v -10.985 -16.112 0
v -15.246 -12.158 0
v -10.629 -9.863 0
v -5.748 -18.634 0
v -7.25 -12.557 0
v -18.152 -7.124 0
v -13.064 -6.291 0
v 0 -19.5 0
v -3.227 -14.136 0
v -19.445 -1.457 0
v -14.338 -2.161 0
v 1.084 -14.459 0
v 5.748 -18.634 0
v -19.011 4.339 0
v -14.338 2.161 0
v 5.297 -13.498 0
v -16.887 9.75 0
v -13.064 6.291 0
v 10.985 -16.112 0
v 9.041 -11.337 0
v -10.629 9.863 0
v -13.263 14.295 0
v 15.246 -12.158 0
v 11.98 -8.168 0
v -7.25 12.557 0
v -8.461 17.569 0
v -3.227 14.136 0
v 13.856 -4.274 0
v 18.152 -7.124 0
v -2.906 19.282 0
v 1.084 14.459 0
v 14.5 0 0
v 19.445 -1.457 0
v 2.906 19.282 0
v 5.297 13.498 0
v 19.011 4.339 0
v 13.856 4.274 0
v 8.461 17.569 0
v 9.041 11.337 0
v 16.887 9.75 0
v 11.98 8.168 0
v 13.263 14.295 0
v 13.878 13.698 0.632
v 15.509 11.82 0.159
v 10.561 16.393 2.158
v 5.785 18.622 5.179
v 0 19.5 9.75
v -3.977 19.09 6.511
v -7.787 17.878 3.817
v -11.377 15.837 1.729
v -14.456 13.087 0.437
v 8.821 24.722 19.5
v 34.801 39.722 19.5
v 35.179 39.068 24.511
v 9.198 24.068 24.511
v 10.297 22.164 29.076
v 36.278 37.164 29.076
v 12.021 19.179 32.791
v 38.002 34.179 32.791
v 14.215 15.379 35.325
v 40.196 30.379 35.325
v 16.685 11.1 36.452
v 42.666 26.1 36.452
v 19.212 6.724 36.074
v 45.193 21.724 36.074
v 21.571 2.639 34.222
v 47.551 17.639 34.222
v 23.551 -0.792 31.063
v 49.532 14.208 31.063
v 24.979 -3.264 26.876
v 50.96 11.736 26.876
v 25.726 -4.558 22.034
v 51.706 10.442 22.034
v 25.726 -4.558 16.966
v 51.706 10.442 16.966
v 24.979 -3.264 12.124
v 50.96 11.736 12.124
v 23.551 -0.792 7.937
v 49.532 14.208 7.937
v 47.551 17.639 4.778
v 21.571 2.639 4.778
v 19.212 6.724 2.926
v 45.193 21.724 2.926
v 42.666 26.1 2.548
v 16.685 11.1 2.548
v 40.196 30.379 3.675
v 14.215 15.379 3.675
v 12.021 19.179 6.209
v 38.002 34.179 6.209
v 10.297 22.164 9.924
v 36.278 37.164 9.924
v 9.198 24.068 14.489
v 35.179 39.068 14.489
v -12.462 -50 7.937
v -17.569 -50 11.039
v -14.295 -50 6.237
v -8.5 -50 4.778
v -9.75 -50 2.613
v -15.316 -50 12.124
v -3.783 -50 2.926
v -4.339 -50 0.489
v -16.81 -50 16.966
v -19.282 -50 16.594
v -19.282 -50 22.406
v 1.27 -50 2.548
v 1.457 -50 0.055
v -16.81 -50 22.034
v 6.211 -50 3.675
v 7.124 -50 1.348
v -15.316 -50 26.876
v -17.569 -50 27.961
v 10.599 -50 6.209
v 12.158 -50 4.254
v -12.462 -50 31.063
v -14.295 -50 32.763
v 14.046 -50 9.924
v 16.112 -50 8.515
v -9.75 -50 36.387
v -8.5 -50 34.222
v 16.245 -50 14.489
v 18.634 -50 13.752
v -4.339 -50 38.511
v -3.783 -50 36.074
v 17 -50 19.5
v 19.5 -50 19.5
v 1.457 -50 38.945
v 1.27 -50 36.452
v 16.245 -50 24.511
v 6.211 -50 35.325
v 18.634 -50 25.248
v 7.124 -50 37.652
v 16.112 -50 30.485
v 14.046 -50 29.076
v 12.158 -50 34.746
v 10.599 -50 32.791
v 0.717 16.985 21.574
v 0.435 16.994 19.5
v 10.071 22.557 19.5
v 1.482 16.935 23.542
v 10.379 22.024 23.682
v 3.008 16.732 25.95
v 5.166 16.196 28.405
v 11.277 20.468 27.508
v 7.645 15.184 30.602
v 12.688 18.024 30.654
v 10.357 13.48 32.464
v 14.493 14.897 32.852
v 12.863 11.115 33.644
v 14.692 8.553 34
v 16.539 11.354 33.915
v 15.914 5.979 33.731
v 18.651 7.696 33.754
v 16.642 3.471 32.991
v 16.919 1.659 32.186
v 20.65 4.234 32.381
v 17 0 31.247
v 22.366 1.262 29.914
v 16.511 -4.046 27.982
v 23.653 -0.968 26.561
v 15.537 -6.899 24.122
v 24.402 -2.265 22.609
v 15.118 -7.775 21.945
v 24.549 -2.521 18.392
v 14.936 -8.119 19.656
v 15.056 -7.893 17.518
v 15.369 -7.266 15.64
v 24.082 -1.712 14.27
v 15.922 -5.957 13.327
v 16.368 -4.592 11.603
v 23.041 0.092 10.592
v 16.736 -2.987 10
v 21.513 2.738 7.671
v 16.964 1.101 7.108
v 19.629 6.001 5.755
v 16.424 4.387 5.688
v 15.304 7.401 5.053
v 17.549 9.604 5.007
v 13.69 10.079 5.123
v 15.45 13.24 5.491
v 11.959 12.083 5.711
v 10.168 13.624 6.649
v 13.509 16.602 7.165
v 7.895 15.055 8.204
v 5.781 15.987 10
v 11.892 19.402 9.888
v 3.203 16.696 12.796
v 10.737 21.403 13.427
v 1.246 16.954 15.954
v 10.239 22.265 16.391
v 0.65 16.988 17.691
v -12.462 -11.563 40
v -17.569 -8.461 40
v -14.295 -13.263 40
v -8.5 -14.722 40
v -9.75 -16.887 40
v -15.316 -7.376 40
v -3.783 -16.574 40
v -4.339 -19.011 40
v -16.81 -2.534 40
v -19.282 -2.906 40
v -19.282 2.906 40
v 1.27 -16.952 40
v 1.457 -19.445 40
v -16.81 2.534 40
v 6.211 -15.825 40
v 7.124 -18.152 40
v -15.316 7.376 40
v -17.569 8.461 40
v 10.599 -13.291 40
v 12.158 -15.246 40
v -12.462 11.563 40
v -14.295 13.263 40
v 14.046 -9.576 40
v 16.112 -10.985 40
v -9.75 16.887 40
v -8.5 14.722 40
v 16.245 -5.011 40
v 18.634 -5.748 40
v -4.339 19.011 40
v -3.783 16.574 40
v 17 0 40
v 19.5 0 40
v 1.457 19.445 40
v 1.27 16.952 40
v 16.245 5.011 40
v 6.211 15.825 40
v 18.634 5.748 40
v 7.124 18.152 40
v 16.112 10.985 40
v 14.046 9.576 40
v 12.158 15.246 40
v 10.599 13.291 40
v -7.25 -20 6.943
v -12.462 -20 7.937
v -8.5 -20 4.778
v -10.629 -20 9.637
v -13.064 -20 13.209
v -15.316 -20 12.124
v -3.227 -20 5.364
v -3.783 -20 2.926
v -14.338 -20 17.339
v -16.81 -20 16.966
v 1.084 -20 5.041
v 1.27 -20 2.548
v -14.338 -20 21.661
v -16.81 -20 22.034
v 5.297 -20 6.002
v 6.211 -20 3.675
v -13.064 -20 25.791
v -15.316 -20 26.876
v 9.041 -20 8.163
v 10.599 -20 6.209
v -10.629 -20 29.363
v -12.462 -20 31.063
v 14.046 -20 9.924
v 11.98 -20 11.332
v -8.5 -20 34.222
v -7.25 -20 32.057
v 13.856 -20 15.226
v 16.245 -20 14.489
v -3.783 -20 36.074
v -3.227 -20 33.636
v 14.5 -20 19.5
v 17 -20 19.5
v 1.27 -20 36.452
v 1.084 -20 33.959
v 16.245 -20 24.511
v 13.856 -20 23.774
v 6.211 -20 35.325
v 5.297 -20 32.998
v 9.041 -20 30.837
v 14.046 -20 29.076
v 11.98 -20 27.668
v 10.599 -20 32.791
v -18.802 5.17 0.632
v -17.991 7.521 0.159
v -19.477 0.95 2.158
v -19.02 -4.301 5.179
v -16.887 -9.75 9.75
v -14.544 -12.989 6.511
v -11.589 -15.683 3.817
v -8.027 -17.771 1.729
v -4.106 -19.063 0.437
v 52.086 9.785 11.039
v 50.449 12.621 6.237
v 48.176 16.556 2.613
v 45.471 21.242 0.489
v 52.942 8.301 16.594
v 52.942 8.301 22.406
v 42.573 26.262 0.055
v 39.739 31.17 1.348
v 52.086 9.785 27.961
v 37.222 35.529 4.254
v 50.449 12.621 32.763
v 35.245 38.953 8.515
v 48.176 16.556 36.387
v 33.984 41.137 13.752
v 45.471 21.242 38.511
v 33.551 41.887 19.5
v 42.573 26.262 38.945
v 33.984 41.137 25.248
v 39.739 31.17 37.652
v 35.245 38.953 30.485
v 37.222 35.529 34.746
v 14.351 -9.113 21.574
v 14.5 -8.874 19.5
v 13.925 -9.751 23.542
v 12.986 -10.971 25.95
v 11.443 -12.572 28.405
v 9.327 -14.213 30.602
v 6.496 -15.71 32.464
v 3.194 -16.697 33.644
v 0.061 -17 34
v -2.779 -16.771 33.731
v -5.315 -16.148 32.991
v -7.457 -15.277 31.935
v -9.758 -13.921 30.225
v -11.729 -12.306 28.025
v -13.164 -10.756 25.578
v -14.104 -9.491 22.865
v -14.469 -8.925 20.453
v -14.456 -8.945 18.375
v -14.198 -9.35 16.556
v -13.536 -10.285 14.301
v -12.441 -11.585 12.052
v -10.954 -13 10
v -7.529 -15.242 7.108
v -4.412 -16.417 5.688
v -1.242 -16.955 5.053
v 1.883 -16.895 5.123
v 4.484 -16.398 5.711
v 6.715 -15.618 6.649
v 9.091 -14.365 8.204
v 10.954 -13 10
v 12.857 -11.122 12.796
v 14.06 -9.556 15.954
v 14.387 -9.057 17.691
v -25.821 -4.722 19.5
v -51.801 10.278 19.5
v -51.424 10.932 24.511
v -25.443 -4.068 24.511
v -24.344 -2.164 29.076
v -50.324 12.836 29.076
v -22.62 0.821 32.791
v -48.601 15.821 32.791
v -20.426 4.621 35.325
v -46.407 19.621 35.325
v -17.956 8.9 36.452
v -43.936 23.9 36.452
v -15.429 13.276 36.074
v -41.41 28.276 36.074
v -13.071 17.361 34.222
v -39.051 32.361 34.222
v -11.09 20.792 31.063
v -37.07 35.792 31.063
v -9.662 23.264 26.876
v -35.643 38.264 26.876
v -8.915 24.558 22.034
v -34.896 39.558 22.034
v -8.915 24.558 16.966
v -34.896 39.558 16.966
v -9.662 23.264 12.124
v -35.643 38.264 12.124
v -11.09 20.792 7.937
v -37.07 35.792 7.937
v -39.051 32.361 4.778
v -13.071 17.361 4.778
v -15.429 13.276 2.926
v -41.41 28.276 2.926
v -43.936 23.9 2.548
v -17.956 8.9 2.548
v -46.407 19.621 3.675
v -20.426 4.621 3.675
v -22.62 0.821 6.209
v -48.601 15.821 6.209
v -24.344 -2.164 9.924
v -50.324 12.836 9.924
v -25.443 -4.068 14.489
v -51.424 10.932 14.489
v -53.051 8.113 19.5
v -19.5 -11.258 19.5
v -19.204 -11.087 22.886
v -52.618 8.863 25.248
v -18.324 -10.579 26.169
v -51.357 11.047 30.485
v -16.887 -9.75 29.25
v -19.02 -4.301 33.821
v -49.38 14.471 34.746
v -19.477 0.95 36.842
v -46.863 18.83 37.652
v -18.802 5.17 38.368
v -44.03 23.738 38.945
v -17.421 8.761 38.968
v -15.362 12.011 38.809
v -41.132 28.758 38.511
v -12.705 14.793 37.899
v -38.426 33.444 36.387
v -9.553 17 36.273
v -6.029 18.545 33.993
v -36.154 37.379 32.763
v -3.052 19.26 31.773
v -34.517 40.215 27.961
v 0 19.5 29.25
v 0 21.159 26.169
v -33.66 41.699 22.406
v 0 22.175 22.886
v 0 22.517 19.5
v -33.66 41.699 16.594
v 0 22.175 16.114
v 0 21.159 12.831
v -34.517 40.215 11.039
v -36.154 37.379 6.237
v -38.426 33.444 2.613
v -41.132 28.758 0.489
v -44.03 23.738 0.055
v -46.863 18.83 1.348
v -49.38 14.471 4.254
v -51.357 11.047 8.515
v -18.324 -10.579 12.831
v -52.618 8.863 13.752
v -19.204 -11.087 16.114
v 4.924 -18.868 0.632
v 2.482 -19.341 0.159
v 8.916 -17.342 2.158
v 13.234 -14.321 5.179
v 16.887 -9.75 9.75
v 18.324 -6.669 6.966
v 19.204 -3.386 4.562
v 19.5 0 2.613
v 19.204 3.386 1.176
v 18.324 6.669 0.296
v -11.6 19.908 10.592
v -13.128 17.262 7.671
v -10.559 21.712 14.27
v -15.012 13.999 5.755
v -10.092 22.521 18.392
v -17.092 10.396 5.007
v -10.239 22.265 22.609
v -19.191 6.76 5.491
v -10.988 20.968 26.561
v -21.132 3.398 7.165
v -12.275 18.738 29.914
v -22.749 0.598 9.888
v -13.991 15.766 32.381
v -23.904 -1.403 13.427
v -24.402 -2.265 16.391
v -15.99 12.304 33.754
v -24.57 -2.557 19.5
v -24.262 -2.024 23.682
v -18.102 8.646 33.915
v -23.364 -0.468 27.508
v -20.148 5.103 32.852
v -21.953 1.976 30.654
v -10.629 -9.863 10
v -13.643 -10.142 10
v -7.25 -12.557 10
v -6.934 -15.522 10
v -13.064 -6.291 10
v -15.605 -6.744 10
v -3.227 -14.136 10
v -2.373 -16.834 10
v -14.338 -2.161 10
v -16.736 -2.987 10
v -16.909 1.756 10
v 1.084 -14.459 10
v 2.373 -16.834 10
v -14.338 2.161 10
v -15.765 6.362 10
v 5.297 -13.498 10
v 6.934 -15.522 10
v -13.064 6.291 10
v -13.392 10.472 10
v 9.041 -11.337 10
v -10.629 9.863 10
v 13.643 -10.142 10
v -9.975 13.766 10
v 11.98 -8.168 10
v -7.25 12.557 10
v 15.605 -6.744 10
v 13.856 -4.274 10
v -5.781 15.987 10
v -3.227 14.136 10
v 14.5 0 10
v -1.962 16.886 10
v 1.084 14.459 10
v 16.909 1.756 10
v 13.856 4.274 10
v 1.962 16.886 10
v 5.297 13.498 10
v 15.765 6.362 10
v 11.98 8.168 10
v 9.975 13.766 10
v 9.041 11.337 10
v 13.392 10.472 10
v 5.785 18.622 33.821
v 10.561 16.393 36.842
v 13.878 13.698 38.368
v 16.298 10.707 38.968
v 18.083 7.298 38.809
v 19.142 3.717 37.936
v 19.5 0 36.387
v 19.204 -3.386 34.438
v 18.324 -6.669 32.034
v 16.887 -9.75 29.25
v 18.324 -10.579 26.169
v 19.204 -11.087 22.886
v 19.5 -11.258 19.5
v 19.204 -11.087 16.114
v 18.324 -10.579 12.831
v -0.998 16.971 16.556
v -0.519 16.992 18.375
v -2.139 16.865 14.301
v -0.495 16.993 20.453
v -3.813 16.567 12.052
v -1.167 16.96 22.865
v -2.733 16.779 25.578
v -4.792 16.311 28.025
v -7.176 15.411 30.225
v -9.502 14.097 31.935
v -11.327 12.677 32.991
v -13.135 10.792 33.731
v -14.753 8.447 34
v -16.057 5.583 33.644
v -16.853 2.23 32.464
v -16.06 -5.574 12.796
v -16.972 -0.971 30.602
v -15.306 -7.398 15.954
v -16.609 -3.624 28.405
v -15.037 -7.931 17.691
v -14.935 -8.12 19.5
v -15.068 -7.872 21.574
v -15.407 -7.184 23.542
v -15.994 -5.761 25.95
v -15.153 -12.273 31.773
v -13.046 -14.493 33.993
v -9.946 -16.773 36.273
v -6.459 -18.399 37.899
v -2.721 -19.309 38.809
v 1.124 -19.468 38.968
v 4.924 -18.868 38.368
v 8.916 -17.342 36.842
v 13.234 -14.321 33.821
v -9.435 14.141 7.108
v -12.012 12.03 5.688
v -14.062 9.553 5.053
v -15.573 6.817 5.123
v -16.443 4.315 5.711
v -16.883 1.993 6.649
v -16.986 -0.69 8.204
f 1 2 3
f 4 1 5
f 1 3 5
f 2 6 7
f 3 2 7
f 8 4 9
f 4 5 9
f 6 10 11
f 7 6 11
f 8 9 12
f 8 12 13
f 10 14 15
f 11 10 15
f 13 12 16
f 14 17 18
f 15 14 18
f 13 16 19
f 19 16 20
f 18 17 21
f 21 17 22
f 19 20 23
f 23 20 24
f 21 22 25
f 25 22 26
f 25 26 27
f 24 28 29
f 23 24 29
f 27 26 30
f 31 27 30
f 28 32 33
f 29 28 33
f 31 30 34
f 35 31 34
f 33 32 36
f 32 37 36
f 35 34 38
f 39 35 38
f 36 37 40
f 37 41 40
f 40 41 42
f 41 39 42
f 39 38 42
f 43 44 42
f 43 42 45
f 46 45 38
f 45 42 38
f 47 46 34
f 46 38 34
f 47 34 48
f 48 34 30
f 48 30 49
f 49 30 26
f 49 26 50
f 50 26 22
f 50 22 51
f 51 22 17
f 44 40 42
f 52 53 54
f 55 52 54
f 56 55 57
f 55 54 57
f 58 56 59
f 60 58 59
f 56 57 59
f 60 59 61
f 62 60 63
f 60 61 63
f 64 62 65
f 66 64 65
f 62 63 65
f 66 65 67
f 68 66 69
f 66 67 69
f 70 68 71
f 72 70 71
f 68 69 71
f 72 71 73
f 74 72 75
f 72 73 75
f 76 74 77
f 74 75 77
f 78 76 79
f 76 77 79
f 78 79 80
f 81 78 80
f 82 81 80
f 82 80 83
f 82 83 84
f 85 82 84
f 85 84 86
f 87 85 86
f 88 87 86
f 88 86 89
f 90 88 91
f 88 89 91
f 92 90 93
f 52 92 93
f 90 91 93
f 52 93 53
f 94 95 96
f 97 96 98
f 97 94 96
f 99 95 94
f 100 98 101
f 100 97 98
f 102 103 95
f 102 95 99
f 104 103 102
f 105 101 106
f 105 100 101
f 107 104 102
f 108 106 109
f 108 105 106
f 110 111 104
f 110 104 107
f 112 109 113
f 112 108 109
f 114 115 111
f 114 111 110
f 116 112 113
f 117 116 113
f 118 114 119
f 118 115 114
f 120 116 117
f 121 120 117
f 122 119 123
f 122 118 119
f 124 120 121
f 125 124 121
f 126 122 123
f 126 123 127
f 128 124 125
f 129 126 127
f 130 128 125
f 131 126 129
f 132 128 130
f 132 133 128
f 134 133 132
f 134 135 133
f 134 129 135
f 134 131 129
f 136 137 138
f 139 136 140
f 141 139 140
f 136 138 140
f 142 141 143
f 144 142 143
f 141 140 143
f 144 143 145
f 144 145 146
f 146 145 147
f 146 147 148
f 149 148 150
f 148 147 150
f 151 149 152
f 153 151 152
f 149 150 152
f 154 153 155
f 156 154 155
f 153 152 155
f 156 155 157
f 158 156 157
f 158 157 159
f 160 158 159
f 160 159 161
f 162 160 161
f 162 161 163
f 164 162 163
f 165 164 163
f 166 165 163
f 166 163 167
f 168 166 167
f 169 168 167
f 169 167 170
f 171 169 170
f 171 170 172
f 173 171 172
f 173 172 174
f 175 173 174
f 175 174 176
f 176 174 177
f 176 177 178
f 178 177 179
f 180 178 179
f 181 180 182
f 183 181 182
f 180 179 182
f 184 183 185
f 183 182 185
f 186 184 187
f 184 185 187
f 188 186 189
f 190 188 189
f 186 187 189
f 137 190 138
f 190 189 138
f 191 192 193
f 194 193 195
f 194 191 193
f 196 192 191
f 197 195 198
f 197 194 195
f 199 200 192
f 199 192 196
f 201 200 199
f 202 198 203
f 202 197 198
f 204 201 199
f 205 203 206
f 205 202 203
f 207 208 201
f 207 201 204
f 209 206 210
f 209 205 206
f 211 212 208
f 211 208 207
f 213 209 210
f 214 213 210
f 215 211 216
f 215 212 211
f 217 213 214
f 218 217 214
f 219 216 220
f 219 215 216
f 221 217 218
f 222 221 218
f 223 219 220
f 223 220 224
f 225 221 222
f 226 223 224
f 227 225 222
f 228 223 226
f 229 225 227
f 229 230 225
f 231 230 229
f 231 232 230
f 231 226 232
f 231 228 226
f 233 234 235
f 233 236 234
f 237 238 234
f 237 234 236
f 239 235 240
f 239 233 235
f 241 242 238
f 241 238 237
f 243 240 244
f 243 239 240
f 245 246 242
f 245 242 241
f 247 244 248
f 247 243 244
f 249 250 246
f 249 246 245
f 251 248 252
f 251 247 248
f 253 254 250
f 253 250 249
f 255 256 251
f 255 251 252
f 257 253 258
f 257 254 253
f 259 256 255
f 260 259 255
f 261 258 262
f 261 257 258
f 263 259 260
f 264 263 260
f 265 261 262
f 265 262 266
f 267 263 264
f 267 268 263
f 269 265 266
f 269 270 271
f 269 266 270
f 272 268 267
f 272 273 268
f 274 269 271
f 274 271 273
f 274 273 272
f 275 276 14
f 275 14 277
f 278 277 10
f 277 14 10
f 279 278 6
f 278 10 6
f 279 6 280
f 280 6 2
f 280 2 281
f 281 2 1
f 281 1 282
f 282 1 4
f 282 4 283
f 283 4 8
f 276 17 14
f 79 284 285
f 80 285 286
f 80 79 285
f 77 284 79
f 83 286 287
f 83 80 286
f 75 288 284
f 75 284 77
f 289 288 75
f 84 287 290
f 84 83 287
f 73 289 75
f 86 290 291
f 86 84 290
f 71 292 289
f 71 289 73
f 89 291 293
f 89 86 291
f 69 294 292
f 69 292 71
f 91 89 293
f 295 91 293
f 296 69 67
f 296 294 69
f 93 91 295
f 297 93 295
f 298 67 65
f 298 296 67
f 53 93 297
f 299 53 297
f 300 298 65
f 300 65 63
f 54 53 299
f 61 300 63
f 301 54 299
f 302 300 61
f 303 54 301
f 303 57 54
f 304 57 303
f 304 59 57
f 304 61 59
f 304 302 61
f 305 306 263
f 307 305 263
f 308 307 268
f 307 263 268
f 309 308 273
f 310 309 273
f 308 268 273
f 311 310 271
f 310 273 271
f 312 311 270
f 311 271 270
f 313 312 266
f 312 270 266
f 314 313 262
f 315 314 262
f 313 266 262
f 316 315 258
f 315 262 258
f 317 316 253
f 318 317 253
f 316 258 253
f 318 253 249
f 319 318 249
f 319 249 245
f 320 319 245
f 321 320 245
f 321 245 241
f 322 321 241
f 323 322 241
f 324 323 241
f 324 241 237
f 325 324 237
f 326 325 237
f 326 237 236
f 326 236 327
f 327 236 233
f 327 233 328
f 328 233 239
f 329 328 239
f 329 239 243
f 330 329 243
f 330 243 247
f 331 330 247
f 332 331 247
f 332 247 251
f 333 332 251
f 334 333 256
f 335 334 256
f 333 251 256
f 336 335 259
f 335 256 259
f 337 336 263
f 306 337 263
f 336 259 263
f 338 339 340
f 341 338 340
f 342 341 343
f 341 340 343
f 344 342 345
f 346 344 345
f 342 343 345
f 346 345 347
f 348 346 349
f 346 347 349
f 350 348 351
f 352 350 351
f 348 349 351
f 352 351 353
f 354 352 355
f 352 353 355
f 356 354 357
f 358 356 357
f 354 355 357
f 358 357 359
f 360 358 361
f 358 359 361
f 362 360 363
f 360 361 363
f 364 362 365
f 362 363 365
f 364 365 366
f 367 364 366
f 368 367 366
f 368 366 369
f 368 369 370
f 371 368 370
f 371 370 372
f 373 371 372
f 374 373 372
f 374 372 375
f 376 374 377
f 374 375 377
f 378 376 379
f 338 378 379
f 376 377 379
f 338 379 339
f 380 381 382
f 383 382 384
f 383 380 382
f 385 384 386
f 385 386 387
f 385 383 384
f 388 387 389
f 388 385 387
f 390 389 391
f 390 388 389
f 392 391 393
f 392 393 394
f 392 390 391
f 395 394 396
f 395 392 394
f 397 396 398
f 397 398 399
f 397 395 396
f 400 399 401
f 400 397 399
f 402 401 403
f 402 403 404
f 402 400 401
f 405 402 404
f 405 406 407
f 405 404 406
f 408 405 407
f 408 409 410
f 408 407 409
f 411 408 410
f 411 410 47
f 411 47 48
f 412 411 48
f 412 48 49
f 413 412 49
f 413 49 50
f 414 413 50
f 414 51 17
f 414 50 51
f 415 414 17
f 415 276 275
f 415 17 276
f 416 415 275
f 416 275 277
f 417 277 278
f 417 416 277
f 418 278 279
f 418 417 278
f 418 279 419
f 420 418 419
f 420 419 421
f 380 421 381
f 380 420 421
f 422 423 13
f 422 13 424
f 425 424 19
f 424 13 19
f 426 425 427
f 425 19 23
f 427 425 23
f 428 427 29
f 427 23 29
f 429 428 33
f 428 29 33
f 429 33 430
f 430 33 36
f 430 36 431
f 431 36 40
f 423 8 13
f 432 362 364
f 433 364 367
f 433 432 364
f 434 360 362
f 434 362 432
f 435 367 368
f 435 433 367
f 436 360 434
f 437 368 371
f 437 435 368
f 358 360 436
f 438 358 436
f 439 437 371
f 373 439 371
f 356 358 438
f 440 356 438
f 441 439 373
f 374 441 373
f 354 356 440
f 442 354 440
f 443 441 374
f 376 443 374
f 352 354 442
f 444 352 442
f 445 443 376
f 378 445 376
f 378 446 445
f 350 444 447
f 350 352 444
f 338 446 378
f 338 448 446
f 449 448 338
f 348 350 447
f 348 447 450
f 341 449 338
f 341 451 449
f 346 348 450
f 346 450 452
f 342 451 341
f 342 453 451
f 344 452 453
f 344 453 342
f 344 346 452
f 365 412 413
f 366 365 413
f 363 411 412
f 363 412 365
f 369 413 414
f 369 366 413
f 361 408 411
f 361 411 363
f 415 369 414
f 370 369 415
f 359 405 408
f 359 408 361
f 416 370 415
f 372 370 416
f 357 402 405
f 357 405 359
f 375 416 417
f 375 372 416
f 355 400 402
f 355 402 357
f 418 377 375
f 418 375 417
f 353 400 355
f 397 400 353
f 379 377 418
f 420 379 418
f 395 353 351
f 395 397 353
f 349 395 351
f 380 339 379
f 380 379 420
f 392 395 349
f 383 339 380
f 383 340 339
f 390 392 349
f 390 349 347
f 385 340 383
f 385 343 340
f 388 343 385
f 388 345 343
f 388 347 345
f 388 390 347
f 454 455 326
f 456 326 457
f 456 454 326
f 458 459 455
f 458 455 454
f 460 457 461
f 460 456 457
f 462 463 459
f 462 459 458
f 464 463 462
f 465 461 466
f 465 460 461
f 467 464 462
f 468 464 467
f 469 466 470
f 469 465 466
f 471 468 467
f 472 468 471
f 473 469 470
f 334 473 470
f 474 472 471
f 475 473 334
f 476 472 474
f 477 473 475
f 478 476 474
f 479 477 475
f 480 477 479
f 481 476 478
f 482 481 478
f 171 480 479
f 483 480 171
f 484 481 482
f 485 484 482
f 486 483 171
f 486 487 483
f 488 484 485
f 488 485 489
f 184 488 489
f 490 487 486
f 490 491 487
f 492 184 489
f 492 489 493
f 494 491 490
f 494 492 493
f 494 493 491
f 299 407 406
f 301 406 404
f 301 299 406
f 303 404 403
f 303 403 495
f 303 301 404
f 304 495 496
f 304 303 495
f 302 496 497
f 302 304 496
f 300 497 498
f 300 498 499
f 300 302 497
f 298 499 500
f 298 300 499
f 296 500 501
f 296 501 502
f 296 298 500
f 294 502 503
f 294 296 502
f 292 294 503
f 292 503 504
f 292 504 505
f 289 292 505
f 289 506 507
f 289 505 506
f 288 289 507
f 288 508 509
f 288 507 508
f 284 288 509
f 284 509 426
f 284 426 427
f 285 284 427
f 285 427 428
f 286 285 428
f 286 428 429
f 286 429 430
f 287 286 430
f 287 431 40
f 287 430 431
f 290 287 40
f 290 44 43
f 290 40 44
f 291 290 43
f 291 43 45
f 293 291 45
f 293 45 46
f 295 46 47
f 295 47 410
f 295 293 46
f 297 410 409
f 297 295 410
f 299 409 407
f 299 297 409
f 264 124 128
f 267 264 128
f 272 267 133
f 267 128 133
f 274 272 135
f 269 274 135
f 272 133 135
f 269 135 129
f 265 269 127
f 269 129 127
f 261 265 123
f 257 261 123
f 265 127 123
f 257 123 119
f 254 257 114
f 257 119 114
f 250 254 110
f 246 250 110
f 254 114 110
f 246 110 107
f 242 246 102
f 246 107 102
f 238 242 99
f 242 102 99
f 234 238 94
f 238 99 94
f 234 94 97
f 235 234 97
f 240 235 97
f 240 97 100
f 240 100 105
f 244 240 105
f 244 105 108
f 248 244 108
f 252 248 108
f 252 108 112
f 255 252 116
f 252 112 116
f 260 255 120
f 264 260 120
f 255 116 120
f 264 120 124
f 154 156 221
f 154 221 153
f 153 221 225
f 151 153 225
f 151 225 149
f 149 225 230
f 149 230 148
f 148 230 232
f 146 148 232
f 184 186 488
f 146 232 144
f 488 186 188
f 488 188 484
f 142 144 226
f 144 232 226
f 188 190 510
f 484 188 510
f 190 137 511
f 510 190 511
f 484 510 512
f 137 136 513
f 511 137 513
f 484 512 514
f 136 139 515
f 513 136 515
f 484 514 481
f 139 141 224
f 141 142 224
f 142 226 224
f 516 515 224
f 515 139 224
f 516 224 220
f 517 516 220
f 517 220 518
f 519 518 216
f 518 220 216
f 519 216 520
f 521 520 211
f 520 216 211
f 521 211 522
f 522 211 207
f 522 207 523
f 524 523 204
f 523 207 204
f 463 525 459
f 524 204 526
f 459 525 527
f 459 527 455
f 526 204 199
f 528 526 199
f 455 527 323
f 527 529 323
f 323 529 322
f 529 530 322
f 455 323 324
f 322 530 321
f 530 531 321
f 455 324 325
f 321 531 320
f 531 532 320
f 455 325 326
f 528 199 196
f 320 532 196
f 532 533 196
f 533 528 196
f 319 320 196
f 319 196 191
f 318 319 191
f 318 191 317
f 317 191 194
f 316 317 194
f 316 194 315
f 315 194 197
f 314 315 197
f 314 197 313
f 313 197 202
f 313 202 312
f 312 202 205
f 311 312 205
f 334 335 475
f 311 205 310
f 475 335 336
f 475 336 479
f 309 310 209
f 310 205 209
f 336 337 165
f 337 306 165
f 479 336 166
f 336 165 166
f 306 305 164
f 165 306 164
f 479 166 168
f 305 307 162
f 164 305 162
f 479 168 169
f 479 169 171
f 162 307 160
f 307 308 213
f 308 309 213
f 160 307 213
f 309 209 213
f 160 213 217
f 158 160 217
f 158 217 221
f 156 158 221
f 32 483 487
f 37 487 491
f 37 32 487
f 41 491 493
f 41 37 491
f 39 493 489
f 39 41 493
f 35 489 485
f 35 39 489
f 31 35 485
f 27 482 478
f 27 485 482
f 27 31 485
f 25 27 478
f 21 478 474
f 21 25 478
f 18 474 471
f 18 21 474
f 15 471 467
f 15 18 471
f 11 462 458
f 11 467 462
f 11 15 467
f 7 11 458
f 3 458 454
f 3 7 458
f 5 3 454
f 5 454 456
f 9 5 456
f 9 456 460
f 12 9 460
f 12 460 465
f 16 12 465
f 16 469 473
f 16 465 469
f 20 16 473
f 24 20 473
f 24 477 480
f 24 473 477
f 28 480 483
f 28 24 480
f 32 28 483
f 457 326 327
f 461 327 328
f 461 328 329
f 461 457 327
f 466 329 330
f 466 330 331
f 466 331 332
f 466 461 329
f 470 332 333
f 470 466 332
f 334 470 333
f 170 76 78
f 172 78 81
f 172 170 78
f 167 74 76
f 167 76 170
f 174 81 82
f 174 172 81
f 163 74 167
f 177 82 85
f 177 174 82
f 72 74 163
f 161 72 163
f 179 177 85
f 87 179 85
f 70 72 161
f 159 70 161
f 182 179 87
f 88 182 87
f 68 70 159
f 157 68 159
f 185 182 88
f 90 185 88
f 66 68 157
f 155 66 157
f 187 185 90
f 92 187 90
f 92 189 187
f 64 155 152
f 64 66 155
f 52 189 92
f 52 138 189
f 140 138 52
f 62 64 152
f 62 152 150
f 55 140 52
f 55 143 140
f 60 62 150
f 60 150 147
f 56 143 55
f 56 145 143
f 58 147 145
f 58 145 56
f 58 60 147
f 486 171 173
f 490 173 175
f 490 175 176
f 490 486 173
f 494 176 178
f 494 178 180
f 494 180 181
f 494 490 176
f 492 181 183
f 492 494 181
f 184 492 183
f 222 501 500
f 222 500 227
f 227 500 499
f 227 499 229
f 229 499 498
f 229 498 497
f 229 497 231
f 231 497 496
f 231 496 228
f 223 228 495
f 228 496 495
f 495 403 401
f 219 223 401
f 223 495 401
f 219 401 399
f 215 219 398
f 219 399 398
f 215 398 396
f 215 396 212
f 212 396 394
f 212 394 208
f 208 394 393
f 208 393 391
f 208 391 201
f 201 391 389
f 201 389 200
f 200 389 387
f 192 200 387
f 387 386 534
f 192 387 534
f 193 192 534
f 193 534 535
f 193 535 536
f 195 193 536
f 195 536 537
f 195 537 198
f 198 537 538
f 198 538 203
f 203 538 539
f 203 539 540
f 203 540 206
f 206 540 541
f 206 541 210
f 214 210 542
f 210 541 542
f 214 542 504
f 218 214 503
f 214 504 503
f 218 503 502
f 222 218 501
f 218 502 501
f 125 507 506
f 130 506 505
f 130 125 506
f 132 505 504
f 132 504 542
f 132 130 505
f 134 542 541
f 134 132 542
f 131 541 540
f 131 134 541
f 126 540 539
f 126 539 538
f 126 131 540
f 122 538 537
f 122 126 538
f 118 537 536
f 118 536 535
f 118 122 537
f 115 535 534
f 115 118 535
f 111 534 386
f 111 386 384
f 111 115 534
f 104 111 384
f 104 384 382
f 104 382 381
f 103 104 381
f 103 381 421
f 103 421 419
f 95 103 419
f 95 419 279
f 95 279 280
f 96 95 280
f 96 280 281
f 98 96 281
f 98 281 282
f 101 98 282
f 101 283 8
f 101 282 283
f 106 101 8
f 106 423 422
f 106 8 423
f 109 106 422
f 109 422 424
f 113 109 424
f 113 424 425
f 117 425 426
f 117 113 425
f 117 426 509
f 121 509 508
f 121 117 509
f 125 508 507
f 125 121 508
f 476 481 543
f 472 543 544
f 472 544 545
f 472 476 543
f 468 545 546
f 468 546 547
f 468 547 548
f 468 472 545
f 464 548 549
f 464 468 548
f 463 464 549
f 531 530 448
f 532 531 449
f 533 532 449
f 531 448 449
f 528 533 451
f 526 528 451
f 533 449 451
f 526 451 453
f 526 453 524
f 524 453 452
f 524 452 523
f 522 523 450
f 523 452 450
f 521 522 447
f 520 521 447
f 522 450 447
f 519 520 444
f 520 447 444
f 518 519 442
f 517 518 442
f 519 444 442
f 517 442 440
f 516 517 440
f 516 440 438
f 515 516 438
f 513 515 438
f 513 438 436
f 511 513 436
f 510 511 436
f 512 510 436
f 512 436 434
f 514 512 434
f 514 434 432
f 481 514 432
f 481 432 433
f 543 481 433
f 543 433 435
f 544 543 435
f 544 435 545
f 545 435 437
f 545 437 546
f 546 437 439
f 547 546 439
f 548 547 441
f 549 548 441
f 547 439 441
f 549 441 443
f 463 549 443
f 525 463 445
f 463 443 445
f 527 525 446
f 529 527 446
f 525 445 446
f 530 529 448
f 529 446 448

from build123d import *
from build123d import SkipClean  # not in build123d's __all__

# Parameters (mm, degrees)
F0_R             = 19.5
F0_R_2           = 14.5
F1_DEPTH         = 40
F2_R             = 17
F3_DEPTH         = 30
F5_R             = 19.5
F6_COPIES_COUNT  = 3
F8_END_RADIUS    = 17
F7_R             = 14.5
F8_REACH         = 132.9006886826
F8_COPIES_COUNT  = 3
F8_COPIES_ANGLE  = 239.9998
F9_R             = 17
F10_DEPTH        = 30
F10_COPIES_COUNT = 3


# Not quite as in the source:
# - a pattern or mirror of a feature is missing from the dataset's text; its kind, count and spacing are read off the source's solid


with BuildPart() as f1:
    # F0 (on Top) → F1 (new body)
    with BuildSketch(Plane.XY):
        Circle(F0_R)
        Circle(F0_R_2, mode=Mode.SUBTRACT)
    extrude(amount=F1_DEPTH)

    # F2 (on face) → F3 (cut)
    with BuildSketch(Plane.XY.offset(40)):
        Circle(F2_R)
    extrude(amount=-F3_DEPTH, mode=Mode.SUBTRACT)

    # F5 (on offset) → F6 (join, up to the next surface of F1)
    with BuildSketch(Plane.XZ.offset(50)):
        with Locations((0, 19.5)):
            Circle(F5_R)
    with SkipClean():  # cleaning this boolean's faces spoils the solid; the shape is the same uncleaned
        f6 = extrude(until=Until.NEXT, dir=(0, 1, 0))

    # F6_copies: F6 ×3 about axis
    f6_copies_axis = Axis((0, 0, 0), (0, 0, 1))
    for i in range(1, F6_COPIES_COUNT):
        add(f6.rotate(f6_copies_axis, i * 360 / F6_COPIES_COUNT), clean=False)

    f8_end = (Plane.XY.offset(25) * Cylinder(F8_END_RADIUS, 557.6990366969, mode=Mode.PRIVATE)).faces().sort_by_distance((-17, 0, 25))[0]
    # F7 (on offset) → F8 (cut, up to the whole of a round face its end follows)
    with BuildSketch(Plane.XZ.offset(50)):
        with Locations((0, 19.5)):
            Circle(F7_R)
    f8_long = extrude(amount=-F8_REACH, mode=Mode.PRIVATE)
    f8 = split(f8_long, bisect_by=f8_end, keep=Keep.ALL, mode=Mode.PRIVATE).solids().sort_by_distance((0, -50, 19.5))[0]
    add(f8, mode=Mode.SUBTRACT)

    # F8_copies: F8 ×3 about axis
    f8_copies_axis = Axis((0, 0, 0), (0, 0, 1))
    for i in range(1, F8_COPIES_COUNT):
        add(f8.rotate(f8_copies_axis, i * F8_COPIES_ANGLE / (F8_COPIES_COUNT - 1)), clean=False, mode=Mode.SUBTRACT)

    # F9 (on offset) → F10 (cut)
    with BuildSketch(Plane.XZ.offset(50)):
        with Locations((0, 19.5)):
            Circle(F9_R)
    f10 = extrude(amount=-F10_DEPTH, mode=Mode.SUBTRACT)

    # F10_copies: F10 ×3 about axis
    f10_copies_axis = Axis((0, 0, 0), (0, 0, 1))
    for i in range(1, F10_COPIES_COUNT):
        add(f10.rotate(f10_copies_axis, i * 360 / F10_COPIES_COUNT), clean=False, mode=Mode.SUBTRACT)


solid = f1.part
